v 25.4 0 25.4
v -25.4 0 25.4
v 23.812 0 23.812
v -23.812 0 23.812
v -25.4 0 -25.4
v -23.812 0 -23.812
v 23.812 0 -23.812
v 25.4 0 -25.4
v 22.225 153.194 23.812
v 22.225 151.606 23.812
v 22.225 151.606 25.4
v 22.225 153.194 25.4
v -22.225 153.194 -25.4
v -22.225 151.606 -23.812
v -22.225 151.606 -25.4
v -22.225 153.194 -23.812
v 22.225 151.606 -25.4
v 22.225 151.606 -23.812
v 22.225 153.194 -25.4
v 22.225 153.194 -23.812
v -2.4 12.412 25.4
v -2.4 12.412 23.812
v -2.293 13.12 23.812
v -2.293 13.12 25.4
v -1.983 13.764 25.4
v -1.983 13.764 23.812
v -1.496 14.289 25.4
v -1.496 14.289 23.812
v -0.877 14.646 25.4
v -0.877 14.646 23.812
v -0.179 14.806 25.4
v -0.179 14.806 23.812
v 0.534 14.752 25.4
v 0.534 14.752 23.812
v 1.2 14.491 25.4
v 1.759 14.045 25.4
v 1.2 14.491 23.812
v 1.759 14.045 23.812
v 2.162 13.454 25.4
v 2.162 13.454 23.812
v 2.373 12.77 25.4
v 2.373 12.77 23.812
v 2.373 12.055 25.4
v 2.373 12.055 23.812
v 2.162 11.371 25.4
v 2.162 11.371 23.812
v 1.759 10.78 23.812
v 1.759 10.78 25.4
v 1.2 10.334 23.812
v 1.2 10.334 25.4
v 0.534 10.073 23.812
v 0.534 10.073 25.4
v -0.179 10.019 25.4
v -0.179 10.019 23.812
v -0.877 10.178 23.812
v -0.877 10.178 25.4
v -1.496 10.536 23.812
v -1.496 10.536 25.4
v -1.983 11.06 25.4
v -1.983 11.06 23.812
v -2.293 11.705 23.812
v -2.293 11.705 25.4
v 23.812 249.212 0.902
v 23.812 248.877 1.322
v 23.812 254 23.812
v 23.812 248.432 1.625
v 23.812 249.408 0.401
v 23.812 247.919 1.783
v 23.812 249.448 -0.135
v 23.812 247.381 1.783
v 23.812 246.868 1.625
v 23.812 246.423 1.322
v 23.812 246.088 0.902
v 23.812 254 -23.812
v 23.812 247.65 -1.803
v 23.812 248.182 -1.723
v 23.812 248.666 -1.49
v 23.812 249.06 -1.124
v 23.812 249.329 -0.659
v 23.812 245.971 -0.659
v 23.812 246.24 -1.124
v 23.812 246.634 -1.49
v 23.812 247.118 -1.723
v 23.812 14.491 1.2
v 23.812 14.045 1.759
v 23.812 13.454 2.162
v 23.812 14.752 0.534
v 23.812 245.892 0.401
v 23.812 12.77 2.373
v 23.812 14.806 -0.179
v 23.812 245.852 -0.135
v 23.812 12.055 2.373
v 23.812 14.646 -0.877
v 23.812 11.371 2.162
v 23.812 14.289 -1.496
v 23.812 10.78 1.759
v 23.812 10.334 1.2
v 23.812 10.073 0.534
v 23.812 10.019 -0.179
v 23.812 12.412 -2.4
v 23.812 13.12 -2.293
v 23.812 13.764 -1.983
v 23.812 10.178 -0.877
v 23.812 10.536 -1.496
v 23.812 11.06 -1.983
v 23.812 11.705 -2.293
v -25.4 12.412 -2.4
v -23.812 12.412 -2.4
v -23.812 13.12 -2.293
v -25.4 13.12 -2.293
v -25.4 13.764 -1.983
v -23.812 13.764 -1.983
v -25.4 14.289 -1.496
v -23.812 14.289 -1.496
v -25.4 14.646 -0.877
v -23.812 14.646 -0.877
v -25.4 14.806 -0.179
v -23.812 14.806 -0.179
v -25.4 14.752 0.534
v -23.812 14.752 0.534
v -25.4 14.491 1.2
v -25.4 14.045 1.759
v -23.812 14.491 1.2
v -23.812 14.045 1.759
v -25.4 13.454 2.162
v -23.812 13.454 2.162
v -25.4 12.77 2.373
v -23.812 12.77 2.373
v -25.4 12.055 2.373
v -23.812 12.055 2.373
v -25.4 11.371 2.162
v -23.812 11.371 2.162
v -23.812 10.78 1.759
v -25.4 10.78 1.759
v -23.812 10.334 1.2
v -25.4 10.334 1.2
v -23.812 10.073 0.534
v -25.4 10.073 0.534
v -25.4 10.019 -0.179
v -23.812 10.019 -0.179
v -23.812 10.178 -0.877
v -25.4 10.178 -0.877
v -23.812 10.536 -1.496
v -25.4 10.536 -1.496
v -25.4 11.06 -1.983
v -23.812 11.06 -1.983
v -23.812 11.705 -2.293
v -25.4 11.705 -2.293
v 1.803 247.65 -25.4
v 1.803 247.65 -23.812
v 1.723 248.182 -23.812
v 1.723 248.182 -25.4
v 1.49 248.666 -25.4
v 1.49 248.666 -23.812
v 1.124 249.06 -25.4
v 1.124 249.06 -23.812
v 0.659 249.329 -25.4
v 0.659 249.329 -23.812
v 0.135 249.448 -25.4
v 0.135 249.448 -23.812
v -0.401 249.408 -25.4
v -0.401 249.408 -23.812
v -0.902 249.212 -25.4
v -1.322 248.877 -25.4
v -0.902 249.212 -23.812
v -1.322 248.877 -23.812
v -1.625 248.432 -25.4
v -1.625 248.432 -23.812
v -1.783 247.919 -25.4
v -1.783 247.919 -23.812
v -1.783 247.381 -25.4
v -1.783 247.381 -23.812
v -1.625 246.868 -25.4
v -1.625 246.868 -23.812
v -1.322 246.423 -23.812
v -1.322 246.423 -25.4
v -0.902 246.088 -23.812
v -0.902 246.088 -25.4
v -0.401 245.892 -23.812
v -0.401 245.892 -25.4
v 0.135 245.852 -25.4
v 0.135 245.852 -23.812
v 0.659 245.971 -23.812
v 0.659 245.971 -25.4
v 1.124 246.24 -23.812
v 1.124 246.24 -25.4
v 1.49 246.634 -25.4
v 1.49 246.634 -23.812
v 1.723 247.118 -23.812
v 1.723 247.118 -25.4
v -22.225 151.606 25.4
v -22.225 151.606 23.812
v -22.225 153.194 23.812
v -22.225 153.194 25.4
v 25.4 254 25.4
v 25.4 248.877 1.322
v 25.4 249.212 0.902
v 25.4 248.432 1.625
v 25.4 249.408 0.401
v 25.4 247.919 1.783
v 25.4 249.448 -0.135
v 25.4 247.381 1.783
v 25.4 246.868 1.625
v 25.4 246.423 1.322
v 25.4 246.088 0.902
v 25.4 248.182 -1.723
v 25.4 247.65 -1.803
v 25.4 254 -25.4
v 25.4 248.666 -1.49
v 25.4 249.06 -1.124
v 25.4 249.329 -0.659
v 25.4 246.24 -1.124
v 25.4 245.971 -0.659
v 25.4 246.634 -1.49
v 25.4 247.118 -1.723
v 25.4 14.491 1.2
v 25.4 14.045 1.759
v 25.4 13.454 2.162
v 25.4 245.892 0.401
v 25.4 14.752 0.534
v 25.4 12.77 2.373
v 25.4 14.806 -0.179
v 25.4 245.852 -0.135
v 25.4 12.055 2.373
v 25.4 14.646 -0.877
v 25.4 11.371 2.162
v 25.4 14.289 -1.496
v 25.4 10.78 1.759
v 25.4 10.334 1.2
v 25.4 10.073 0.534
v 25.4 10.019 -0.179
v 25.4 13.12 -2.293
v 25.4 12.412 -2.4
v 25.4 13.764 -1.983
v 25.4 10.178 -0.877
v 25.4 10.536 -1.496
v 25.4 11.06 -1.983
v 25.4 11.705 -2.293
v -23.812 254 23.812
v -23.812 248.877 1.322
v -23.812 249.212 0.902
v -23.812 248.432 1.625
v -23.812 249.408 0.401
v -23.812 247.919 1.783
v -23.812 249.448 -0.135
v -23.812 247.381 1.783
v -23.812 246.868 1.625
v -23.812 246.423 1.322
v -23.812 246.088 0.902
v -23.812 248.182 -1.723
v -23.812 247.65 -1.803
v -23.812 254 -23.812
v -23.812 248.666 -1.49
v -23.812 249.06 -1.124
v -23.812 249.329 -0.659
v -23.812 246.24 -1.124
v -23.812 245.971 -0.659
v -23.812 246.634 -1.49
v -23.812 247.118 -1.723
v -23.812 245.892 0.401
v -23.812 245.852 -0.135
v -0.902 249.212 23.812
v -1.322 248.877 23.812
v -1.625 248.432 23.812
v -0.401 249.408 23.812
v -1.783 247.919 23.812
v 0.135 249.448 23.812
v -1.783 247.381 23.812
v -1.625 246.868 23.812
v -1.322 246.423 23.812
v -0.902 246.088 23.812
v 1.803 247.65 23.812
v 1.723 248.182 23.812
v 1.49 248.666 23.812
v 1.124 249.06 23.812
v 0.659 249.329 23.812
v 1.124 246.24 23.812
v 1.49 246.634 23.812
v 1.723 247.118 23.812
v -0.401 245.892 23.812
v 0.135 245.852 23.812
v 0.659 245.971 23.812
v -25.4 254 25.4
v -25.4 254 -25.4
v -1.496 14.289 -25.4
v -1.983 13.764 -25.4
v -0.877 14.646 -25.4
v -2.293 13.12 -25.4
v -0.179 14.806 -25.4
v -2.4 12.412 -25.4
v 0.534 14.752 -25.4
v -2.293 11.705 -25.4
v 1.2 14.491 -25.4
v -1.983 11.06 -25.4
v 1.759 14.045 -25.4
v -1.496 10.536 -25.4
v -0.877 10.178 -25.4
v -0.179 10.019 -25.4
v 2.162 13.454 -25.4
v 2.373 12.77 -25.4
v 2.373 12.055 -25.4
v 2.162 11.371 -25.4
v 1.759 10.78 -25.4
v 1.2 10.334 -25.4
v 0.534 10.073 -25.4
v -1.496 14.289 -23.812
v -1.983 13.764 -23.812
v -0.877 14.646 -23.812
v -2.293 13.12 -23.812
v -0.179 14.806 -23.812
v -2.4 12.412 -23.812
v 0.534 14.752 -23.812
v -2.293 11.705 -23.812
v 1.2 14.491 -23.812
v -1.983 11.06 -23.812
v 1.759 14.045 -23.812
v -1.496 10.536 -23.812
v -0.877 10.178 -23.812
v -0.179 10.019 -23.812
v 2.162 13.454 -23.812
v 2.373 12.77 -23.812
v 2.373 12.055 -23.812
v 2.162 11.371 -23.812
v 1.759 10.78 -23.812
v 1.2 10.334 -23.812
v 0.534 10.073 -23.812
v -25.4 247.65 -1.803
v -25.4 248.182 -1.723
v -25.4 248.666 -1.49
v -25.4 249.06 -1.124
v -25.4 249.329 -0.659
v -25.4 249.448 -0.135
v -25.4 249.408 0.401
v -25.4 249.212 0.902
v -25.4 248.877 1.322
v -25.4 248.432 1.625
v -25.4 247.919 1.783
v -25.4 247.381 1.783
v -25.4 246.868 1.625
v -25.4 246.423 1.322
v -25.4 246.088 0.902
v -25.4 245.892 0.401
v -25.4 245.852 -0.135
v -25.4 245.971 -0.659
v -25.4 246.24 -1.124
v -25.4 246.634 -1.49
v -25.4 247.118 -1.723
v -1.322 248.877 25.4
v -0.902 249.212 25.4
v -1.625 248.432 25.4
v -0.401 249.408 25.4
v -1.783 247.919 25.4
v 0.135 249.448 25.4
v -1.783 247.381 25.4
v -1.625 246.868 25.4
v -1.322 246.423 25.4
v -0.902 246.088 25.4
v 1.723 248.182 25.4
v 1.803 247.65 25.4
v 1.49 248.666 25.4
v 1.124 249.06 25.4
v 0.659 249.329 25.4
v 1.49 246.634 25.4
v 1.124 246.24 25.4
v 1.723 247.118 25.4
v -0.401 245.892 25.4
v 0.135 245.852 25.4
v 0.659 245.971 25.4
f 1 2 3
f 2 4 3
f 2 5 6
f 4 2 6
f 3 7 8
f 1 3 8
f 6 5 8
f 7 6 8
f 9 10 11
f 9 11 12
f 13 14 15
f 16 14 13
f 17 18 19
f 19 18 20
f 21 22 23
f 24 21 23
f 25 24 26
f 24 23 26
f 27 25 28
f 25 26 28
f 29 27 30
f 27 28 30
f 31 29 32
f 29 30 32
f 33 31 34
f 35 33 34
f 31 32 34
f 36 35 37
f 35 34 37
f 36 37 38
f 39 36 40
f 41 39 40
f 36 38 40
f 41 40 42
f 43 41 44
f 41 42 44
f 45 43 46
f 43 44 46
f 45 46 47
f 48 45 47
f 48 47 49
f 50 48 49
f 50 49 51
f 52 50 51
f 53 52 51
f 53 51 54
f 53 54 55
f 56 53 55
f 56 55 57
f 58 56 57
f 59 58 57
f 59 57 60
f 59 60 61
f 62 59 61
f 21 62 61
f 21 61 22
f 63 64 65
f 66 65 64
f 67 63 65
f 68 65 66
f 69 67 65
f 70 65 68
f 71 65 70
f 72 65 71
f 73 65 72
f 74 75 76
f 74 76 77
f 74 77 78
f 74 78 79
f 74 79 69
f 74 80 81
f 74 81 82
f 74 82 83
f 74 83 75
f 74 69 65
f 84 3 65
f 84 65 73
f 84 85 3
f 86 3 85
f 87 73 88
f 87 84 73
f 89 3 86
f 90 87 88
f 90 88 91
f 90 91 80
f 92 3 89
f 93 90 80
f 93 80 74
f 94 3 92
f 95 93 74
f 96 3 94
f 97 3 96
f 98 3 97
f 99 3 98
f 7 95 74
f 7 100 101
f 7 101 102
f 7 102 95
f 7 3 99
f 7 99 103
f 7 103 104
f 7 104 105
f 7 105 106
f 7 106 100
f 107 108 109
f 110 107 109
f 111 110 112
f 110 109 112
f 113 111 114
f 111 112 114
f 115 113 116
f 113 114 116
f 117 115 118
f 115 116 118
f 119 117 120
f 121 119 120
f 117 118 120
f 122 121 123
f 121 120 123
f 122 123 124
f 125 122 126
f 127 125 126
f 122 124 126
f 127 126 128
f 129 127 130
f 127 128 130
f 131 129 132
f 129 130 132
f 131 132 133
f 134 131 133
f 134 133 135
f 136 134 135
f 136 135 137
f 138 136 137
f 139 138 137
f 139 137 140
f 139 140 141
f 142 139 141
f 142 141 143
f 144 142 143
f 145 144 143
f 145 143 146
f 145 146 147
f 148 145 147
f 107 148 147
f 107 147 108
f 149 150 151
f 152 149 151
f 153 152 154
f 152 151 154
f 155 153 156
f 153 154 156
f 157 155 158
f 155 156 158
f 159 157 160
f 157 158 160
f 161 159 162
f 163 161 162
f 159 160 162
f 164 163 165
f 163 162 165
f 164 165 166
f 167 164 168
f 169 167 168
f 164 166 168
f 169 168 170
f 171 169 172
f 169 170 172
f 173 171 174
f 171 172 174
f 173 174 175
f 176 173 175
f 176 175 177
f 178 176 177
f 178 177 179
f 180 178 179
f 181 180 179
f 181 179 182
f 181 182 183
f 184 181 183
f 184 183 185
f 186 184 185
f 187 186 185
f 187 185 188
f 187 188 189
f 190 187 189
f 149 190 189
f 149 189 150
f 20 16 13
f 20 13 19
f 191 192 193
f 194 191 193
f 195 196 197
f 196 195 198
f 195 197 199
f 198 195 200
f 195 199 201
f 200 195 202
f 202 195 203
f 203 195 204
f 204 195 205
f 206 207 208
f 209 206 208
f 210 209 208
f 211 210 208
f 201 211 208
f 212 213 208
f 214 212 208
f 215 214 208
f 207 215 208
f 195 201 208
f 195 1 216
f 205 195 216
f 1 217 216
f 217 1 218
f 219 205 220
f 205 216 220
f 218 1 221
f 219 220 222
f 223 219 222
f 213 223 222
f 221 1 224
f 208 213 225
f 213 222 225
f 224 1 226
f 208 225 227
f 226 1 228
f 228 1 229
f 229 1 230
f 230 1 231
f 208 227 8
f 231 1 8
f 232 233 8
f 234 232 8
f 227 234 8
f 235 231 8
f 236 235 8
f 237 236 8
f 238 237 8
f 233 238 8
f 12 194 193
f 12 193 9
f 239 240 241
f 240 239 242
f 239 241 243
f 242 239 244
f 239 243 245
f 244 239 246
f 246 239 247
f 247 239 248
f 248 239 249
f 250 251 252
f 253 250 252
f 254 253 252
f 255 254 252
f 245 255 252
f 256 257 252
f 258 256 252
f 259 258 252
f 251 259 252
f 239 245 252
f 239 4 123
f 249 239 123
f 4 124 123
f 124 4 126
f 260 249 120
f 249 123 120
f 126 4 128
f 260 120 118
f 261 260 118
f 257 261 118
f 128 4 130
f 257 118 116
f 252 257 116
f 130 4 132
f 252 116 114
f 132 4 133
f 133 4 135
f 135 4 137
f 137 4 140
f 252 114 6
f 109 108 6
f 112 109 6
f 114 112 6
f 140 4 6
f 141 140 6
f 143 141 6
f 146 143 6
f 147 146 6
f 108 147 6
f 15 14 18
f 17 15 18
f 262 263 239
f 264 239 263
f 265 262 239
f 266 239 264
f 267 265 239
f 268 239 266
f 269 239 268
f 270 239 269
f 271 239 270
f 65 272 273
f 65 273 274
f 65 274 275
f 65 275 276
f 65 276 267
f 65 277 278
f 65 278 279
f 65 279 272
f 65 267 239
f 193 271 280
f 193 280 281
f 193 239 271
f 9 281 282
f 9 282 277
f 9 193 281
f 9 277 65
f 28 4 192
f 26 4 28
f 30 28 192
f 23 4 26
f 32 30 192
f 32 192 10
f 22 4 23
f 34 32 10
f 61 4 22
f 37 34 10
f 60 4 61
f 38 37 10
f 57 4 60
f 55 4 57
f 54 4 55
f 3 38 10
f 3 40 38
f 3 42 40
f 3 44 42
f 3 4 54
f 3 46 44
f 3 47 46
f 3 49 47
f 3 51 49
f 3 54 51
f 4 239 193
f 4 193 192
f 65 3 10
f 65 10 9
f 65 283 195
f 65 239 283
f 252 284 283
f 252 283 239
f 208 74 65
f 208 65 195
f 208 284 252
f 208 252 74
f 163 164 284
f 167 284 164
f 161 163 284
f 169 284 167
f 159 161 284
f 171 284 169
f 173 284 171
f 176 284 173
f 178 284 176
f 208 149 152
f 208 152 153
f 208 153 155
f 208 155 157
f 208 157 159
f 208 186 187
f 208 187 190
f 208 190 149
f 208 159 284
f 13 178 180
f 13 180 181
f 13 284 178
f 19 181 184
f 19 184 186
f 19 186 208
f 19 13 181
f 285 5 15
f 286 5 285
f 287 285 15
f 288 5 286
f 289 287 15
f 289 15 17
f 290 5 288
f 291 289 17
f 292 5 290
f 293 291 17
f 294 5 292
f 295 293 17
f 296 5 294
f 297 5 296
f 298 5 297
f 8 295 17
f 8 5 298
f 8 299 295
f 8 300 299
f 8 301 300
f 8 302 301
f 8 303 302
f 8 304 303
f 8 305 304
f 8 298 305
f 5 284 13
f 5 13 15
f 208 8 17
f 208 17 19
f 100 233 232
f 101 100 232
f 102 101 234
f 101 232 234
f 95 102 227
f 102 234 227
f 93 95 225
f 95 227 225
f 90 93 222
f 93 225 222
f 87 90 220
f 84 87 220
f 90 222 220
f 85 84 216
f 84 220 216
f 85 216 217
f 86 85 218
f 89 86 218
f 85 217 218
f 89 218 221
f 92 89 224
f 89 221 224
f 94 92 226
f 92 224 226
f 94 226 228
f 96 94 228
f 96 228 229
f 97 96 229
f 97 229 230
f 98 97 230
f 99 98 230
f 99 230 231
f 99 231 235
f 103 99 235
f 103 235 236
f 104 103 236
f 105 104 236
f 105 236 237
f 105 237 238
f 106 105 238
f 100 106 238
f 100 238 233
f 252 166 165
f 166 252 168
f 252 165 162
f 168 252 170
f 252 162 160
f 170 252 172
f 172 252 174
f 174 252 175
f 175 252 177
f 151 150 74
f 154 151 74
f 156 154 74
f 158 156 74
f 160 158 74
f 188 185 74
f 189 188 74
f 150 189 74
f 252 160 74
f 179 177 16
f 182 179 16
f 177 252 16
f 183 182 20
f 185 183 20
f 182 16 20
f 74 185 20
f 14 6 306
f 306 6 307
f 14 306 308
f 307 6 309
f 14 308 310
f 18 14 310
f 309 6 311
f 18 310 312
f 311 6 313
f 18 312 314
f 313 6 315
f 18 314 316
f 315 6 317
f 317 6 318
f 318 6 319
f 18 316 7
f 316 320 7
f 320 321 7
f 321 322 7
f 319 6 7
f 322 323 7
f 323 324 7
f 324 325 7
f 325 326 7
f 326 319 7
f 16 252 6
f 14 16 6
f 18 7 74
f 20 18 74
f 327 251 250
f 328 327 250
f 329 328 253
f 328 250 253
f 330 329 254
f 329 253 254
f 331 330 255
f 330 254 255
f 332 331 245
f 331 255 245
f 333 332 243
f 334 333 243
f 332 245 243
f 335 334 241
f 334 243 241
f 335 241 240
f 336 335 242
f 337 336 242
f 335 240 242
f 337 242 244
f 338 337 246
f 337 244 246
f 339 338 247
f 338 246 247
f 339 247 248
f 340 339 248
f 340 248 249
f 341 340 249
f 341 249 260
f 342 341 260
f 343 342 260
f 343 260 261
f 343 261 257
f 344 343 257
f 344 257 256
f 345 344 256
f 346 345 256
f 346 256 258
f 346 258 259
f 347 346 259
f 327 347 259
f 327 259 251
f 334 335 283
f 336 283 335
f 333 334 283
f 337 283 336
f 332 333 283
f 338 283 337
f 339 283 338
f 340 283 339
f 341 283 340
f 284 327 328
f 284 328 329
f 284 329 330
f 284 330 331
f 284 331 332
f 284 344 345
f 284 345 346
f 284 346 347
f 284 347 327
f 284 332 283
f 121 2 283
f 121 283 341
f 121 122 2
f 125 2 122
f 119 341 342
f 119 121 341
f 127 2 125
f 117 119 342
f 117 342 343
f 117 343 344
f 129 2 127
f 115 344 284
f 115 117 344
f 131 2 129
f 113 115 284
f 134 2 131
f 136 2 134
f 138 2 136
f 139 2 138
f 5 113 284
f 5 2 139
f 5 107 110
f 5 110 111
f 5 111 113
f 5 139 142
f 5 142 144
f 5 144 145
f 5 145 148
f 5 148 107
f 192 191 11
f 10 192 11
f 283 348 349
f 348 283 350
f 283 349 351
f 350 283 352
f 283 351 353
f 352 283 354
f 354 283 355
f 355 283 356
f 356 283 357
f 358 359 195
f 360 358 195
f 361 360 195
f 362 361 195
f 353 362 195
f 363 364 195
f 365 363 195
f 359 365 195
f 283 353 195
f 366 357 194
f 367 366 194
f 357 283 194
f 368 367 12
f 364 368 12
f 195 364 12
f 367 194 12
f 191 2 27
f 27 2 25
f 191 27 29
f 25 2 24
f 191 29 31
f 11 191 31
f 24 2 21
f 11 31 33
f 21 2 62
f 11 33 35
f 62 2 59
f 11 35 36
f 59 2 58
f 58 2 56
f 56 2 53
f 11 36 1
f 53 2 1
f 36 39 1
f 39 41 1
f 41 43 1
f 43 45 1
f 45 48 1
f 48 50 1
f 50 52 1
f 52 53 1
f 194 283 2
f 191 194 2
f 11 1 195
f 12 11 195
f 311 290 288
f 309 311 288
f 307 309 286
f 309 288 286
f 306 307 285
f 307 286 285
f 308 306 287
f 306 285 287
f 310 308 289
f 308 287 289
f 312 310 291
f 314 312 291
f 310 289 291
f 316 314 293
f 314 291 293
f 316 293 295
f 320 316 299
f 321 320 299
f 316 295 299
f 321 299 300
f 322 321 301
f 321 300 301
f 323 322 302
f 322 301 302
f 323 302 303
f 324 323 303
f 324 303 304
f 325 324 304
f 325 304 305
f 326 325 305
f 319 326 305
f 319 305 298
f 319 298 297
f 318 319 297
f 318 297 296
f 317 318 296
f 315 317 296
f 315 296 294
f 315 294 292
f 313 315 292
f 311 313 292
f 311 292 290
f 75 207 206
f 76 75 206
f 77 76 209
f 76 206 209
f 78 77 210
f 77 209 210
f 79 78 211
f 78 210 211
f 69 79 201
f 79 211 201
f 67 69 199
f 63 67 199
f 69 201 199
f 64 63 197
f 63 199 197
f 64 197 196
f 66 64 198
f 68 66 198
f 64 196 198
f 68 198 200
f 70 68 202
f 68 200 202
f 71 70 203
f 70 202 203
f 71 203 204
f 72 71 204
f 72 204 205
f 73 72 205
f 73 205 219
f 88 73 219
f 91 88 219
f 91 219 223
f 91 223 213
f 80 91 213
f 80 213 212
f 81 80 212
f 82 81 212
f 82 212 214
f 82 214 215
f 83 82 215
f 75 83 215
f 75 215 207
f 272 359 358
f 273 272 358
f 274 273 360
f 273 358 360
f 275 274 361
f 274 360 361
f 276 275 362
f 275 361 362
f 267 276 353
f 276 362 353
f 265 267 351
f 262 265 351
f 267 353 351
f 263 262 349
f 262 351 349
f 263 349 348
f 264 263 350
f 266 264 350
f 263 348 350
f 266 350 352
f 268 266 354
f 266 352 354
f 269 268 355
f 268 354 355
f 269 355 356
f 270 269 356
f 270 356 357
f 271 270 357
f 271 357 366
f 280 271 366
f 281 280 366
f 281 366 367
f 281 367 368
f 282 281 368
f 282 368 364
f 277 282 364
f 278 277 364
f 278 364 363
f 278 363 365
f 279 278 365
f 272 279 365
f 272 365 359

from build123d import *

# Parameters (mm, degrees)
SKETCH1_W               = 50.8
SKETCH1_H               = 50.8
SKETCH1_W_2             = 47.625
SKETCH1_H_2             = 47.625
BOSS_EXTRUDE1_DEPTH     = 254
SKETCH6_R               = 2.3999952
CUT_EXTRUDE3_DEPTH      = 1
CUT_EXTRUDE3_DEPTH_BACK = 51.8
SKETCH7_R               = 2.3999952
CUT_EXTRUDE4_DEPTH      = 1
CUT_EXTRUDE4_DEPTH_BACK = 51.8
SKETCH8_R               = 1.8034
CUT_EXTRUDE5_DEPTH      = 51.8
SKETCH9_R               = 1.8034
CUT_EXTRUDE6_DEPTH      = 51.8
SKETCH10_W              = 44.45
SKETCH10_H              = 1.5875
CUT_EXTRUDE7_DEPTH      = 51.8


with BuildPart() as part:
    # Sketch1 → Boss-Extrude1 (new body)
    with BuildSketch(Plane(origin=(0, 0, 0), x_dir=(1, 0, 0), z_dir=(0, 1, 0))):
        Rectangle(SKETCH1_W, SKETCH1_H)
        Rectangle(SKETCH1_W_2, SKETCH1_H_2, mode=Mode.SUBTRACT)
    extrude(amount=BOSS_EXTRUDE1_DEPTH)

    # Sketch6 → Cut-Extrude3 (cut, two sides)
    with BuildSketch(Plane(origin=(25.4, 0, 0), x_dir=(0, 0, -1), z_dir=(1, 0, 0))) as cut_extrude3_sk:
        with Locations((0, 12.412400118)):
            Circle(SKETCH6_R)
    extrude(amount=CUT_EXTRUDE3_DEPTH, mode=Mode.SUBTRACT)
    extrude(cut_extrude3_sk.sketch, amount=-CUT_EXTRUDE3_DEPTH_BACK, mode=Mode.SUBTRACT)

    # Sketch7 → Cut-Extrude4 (cut, two sides)
    with BuildSketch(Plane(origin=(0, 0, -25.4), x_dir=(-1, 0, 0), z_dir=(0, 0, -1))) as cut_extrude4_sk:
        with Locations((0, 12.412400118)):
            Circle(SKETCH7_R)
    extrude(amount=CUT_EXTRUDE4_DEPTH, mode=Mode.SUBTRACT)
    extrude(cut_extrude4_sk.sketch, amount=-CUT_EXTRUDE4_DEPTH_BACK, mode=Mode.SUBTRACT)

    # Sketch8 → Cut-Extrude5 (cut, through all)
    with BuildSketch(Plane(origin=(25.4, 0, 0), x_dir=(0, 0, -1), z_dir=(1, 0, 0))):
        with Locations((0, 247.65)):
            Circle(SKETCH8_R)
    extrude(amount=-CUT_EXTRUDE5_DEPTH, mode=Mode.SUBTRACT)

    # Sketch9 → Cut-Extrude6 (cut, through all)
    with BuildSketch(Plane.XY.offset(25.4)):
        with Locations((0, 247.65)):
            Circle(SKETCH9_R)
    extrude(amount=-CUT_EXTRUDE6_DEPTH, mode=Mode.SUBTRACT)

    # Sketch10 → Cut-Extrude7 (cut, through all)
    with BuildSketch(Plane.XY.offset(25.4)):
        with Locations((0, 152.4)):
            Rectangle(SKETCH10_W, SKETCH10_H)
    extrude(amount=-CUT_EXTRUDE7_DEPTH, mode=Mode.SUBTRACT)


solid = part.part
